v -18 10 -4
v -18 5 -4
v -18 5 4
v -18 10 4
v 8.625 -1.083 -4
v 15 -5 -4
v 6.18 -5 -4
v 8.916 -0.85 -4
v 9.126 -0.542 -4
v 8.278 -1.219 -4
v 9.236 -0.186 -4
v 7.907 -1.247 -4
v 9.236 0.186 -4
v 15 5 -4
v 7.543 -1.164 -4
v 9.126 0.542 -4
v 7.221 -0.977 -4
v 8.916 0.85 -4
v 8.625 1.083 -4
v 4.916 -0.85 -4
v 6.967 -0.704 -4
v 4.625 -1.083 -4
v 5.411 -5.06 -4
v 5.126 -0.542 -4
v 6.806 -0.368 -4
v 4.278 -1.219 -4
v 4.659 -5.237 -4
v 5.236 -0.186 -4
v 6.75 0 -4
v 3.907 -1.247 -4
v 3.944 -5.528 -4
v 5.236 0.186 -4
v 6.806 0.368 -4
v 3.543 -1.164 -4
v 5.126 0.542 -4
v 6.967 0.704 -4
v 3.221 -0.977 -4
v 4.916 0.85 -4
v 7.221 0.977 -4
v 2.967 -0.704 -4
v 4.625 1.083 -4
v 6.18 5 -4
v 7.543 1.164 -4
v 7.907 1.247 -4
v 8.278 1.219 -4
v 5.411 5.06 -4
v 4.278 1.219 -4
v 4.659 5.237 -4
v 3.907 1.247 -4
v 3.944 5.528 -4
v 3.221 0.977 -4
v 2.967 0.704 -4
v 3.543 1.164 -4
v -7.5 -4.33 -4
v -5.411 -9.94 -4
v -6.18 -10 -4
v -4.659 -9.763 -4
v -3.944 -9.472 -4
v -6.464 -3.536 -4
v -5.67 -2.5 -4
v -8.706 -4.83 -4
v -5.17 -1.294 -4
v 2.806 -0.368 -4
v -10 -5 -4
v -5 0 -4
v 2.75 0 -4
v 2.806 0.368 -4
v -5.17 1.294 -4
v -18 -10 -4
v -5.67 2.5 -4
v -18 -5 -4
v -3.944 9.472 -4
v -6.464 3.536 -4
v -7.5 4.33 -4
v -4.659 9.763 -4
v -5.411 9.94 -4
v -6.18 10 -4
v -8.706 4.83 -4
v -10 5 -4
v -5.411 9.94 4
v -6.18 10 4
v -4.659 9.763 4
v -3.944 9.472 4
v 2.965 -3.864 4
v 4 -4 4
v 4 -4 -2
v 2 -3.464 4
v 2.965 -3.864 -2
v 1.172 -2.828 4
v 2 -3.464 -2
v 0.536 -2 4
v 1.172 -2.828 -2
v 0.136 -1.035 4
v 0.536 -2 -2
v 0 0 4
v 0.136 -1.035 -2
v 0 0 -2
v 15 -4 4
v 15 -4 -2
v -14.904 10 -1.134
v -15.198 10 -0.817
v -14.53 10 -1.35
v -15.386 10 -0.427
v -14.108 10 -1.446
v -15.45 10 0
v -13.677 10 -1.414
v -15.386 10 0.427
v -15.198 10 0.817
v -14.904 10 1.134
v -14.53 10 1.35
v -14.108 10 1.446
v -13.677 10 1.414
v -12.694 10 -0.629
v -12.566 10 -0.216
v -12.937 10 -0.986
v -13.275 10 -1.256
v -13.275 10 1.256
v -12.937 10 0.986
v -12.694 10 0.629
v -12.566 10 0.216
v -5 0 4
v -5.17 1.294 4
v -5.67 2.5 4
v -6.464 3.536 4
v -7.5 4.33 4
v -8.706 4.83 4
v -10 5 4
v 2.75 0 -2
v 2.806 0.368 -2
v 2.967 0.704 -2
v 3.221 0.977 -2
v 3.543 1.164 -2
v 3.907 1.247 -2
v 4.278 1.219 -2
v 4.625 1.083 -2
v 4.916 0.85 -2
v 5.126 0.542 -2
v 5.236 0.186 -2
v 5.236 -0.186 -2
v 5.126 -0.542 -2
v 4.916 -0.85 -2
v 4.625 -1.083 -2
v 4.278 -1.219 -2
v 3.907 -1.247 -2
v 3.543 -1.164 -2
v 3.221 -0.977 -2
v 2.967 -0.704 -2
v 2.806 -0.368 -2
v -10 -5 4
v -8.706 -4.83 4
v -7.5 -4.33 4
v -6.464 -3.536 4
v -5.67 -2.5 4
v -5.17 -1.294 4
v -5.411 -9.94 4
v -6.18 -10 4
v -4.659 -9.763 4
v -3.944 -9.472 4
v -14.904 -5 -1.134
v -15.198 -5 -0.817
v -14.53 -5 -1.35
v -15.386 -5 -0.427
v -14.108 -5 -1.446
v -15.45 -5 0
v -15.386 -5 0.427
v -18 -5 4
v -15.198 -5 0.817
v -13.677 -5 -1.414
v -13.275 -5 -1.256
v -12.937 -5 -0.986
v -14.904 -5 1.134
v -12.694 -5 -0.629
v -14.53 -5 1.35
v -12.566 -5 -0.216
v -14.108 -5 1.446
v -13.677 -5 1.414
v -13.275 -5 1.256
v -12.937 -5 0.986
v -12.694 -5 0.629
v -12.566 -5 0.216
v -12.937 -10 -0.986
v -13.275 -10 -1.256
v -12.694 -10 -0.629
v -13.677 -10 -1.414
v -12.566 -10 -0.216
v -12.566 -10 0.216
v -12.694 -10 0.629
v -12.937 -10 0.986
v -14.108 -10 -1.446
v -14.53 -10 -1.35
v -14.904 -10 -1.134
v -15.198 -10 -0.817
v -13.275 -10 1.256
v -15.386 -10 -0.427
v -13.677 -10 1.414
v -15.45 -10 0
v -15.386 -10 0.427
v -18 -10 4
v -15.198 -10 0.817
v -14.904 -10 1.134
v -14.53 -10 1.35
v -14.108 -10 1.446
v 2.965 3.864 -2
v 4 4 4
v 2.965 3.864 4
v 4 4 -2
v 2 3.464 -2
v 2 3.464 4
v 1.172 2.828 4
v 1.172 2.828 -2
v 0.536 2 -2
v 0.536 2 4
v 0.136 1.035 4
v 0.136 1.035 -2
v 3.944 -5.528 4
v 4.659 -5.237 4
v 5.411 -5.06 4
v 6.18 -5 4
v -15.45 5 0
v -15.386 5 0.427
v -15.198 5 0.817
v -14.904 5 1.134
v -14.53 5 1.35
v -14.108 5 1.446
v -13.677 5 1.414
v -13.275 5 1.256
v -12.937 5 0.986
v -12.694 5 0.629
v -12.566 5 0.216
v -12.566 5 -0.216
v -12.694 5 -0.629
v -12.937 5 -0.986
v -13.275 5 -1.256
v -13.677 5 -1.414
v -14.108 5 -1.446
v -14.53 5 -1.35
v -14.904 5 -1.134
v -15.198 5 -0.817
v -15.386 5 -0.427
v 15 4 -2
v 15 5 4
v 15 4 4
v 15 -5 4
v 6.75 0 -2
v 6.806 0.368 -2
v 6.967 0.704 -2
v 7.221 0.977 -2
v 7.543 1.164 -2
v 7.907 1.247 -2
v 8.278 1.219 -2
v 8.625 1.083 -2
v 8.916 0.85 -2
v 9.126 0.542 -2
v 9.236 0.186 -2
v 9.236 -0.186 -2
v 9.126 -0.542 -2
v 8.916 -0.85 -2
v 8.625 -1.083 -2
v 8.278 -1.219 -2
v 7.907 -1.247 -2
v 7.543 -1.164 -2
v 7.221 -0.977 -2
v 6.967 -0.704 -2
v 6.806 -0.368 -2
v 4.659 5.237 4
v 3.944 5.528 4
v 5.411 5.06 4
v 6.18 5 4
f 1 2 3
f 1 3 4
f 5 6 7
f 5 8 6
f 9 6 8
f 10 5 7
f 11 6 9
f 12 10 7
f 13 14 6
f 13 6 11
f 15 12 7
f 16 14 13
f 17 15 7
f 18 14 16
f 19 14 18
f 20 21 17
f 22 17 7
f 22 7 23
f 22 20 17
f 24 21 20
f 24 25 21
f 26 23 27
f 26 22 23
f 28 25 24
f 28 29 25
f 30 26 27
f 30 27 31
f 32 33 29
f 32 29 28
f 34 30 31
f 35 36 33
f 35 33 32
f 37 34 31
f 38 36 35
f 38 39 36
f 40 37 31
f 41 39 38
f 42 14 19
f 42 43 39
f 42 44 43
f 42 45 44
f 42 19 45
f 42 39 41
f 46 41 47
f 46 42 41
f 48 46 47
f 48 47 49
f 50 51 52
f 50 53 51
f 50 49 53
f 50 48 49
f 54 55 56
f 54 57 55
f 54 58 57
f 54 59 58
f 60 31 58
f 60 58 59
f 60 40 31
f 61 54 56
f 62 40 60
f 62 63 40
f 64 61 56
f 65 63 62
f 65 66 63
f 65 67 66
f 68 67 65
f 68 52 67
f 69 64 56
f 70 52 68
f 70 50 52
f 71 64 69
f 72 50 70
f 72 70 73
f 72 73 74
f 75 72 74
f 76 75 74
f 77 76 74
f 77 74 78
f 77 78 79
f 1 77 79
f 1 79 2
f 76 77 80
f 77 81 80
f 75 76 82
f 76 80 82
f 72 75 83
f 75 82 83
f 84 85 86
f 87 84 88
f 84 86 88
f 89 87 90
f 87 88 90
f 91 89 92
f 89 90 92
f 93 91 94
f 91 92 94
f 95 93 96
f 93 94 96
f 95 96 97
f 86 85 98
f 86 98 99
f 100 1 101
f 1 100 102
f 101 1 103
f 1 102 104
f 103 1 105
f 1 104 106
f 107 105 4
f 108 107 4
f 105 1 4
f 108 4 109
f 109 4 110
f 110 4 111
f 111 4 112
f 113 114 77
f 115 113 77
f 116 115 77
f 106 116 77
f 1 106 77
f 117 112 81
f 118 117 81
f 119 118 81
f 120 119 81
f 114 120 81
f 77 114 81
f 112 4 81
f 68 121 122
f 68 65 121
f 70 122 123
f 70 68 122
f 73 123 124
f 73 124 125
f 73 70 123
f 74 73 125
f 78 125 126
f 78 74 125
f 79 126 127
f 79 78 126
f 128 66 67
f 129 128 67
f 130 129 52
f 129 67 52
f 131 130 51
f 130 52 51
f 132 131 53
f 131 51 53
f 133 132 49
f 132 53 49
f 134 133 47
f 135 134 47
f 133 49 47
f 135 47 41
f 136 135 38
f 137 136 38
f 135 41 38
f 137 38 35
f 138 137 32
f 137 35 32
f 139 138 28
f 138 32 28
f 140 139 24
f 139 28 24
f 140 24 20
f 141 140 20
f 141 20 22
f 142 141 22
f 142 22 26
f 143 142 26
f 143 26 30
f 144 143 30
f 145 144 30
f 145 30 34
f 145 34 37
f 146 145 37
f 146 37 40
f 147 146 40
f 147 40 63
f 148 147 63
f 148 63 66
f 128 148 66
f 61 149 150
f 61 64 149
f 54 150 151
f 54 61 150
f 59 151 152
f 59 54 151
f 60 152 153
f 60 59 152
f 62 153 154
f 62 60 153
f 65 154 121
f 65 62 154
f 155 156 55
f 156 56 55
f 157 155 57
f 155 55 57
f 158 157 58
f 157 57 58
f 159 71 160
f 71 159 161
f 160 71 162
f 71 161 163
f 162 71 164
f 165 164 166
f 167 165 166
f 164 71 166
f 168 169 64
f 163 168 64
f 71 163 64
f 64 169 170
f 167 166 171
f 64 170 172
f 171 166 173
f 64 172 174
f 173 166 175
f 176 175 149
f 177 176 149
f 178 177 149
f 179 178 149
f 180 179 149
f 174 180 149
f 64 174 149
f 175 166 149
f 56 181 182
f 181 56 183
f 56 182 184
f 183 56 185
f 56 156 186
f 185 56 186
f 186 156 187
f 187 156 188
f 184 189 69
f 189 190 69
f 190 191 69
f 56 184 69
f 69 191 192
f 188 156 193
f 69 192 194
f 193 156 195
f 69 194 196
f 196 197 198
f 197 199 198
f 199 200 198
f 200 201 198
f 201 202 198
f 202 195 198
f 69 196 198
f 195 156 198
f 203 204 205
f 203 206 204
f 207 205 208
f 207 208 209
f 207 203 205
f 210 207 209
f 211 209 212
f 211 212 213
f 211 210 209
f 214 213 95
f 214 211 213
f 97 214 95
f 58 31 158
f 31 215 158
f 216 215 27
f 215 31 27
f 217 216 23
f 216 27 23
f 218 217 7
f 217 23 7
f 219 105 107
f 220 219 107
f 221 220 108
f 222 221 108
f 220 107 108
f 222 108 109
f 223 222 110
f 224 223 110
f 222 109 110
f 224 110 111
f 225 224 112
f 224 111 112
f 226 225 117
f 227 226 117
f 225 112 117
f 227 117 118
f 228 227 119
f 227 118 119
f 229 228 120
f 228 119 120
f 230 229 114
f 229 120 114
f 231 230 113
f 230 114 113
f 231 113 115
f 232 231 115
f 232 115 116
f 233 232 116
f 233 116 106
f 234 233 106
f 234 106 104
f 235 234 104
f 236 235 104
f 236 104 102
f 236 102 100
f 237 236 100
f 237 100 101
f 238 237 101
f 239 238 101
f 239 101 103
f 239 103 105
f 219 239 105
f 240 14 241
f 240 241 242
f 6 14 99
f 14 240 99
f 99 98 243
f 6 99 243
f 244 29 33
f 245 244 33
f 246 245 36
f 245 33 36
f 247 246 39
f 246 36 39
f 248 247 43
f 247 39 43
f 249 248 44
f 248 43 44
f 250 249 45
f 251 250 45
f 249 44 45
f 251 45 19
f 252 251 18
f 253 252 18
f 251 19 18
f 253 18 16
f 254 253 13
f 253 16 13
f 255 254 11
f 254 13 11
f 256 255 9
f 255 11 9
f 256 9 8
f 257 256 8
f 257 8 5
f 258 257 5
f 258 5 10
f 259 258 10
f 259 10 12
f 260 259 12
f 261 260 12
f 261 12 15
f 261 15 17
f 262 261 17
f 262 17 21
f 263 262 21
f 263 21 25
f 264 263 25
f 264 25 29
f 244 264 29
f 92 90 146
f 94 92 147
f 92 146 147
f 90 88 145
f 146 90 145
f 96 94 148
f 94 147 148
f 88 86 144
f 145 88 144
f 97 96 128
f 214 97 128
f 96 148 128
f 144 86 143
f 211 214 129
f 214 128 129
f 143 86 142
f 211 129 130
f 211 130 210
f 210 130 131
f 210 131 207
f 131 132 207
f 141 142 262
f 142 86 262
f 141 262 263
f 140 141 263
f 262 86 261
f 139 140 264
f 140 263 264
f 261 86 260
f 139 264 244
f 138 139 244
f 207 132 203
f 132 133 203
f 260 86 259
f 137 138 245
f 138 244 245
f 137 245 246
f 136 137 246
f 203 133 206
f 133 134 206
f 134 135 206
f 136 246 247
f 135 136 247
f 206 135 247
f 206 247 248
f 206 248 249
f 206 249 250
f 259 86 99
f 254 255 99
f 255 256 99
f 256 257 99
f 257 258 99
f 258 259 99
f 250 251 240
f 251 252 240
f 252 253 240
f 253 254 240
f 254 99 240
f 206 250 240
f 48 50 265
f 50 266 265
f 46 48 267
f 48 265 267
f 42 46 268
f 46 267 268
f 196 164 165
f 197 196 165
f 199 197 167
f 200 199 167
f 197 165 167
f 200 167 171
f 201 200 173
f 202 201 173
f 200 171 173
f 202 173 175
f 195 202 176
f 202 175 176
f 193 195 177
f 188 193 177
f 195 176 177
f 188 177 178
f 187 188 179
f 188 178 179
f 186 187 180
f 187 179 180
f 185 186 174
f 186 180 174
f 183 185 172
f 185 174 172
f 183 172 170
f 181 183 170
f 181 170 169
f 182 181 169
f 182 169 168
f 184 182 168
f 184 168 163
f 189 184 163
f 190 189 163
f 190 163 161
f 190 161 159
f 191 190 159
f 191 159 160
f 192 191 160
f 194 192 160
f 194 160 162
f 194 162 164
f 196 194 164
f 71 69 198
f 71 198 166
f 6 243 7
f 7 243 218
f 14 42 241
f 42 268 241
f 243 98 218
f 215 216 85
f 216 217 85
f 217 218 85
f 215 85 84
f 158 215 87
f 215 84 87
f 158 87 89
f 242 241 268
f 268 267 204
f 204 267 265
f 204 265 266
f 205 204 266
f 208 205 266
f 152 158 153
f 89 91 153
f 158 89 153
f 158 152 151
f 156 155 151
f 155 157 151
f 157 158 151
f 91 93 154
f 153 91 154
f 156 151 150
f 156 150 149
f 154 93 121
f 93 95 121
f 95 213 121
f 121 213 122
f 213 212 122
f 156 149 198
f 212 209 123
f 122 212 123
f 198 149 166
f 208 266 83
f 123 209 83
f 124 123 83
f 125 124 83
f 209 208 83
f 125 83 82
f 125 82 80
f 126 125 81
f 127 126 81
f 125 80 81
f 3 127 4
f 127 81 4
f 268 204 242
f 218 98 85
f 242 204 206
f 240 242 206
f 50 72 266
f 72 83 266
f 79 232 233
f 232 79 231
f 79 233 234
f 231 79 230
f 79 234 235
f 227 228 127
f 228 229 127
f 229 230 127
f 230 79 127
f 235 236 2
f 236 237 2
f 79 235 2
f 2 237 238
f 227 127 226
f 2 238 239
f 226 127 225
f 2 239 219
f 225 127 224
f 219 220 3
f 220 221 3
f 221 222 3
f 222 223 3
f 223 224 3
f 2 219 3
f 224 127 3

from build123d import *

# Parameters (mm, degrees)
BOSS_EXTRUDE1_DEPTH = 4
SKETCH3_W           = 6
SKETCH3_H           = 8
CUT_EXTRUDE1_DEPTH  = 15
FILLET1_R           = 4
SKETCH4_R           = 1.25
CUT_EXTRUDE2_DEPTH  = 23.090722034
FILLET2_R           = 5
FILLET3_R           = 5
SKETCH6_R           = 1.45
CUT_EXTRUDE3_DEPTH  = 28.202941017


with BuildPart() as part:
    # Sketch1 → Boss-Extrude1 (new, symmetric)
    with BuildSketch(Plane.XY):
        Polygon((15, 5), (15, -5), (5, -5), (-5, -10), (-18, -10), (-18, -5), (-5, -5), (-5, 5), (-18, 5), (-18, 10), (-5, 10), (5, 5), align=None)
    extrude(amount=BOSS_EXTRUDE1_DEPTH, both=True)

    # Sketch3 → Cut-Extrude1 (cut)
    with BuildSketch(Plane(origin=(15, 0, 0), x_dir=(0, 0, -1), z_dir=(1, 0, 0))):
        with Locations((-1, 0)):
            Rectangle(SKETCH3_W, SKETCH3_H)
    extrude(amount=-CUT_EXTRUDE1_DEPTH, mode=Mode.SUBTRACT)

    # Fillet1
    fillet1_edges = [part.edges().sort_by_distance(p)[0] for p in [
        (0, -4, 1),
        (0, 4, 1),
    ]]
    fillet(fillet1_edges, radius=FILLET1_R - 0.0001)  # a hair under: the kernel refuses the full size

    # Sketch4 → Cut-Extrude2 (cut, through all)
    with BuildSketch(Plane(origin=(0, 0, -4), x_dir=(-1, 0, 0), z_dir=(0, 0, -1))):
        with Locations((-4, 0)):
            Circle(SKETCH4_R)
        with Locations((-8, 0)):
            Circle(SKETCH4_R)
    extrude(amount=-CUT_EXTRUDE2_DEPTH, mode=Mode.SUBTRACT)

    # Fillet2
    fillet2_edges = [part.edges().sort_by_distance(p)[0] for p in [
        (-5, 5, 0),
        (-5, -5, 0),
    ]]
    fillet(fillet2_edges, radius=FILLET2_R - 0.0001)  # a hair under: the kernel refuses the full size

    # Fillet3
    fillet3_edges = [part.edges().sort_by_distance(p)[0] for p in [
        (-5, 10, 0),
        (5, 5, 0),
        (5, -5, 0),
        (-5, -10, 0),
    ]]
    fillet(fillet3_edges, radius=FILLET3_R)

    # Sketch6 → Cut-Extrude3 (cut, through all)
    with BuildSketch(Plane(origin=(0, 10, 0), x_dir=(1, 0, 0), z_dir=(0, 1, 0))):
        with Locations(Location((-14, 0, 0), (0, 0, 180))):
            Circle(SKETCH6_R)
    extrude(amount=-CUT_EXTRUDE3_DEPTH, mode=Mode.SUBTRACT)


solid = part.part
